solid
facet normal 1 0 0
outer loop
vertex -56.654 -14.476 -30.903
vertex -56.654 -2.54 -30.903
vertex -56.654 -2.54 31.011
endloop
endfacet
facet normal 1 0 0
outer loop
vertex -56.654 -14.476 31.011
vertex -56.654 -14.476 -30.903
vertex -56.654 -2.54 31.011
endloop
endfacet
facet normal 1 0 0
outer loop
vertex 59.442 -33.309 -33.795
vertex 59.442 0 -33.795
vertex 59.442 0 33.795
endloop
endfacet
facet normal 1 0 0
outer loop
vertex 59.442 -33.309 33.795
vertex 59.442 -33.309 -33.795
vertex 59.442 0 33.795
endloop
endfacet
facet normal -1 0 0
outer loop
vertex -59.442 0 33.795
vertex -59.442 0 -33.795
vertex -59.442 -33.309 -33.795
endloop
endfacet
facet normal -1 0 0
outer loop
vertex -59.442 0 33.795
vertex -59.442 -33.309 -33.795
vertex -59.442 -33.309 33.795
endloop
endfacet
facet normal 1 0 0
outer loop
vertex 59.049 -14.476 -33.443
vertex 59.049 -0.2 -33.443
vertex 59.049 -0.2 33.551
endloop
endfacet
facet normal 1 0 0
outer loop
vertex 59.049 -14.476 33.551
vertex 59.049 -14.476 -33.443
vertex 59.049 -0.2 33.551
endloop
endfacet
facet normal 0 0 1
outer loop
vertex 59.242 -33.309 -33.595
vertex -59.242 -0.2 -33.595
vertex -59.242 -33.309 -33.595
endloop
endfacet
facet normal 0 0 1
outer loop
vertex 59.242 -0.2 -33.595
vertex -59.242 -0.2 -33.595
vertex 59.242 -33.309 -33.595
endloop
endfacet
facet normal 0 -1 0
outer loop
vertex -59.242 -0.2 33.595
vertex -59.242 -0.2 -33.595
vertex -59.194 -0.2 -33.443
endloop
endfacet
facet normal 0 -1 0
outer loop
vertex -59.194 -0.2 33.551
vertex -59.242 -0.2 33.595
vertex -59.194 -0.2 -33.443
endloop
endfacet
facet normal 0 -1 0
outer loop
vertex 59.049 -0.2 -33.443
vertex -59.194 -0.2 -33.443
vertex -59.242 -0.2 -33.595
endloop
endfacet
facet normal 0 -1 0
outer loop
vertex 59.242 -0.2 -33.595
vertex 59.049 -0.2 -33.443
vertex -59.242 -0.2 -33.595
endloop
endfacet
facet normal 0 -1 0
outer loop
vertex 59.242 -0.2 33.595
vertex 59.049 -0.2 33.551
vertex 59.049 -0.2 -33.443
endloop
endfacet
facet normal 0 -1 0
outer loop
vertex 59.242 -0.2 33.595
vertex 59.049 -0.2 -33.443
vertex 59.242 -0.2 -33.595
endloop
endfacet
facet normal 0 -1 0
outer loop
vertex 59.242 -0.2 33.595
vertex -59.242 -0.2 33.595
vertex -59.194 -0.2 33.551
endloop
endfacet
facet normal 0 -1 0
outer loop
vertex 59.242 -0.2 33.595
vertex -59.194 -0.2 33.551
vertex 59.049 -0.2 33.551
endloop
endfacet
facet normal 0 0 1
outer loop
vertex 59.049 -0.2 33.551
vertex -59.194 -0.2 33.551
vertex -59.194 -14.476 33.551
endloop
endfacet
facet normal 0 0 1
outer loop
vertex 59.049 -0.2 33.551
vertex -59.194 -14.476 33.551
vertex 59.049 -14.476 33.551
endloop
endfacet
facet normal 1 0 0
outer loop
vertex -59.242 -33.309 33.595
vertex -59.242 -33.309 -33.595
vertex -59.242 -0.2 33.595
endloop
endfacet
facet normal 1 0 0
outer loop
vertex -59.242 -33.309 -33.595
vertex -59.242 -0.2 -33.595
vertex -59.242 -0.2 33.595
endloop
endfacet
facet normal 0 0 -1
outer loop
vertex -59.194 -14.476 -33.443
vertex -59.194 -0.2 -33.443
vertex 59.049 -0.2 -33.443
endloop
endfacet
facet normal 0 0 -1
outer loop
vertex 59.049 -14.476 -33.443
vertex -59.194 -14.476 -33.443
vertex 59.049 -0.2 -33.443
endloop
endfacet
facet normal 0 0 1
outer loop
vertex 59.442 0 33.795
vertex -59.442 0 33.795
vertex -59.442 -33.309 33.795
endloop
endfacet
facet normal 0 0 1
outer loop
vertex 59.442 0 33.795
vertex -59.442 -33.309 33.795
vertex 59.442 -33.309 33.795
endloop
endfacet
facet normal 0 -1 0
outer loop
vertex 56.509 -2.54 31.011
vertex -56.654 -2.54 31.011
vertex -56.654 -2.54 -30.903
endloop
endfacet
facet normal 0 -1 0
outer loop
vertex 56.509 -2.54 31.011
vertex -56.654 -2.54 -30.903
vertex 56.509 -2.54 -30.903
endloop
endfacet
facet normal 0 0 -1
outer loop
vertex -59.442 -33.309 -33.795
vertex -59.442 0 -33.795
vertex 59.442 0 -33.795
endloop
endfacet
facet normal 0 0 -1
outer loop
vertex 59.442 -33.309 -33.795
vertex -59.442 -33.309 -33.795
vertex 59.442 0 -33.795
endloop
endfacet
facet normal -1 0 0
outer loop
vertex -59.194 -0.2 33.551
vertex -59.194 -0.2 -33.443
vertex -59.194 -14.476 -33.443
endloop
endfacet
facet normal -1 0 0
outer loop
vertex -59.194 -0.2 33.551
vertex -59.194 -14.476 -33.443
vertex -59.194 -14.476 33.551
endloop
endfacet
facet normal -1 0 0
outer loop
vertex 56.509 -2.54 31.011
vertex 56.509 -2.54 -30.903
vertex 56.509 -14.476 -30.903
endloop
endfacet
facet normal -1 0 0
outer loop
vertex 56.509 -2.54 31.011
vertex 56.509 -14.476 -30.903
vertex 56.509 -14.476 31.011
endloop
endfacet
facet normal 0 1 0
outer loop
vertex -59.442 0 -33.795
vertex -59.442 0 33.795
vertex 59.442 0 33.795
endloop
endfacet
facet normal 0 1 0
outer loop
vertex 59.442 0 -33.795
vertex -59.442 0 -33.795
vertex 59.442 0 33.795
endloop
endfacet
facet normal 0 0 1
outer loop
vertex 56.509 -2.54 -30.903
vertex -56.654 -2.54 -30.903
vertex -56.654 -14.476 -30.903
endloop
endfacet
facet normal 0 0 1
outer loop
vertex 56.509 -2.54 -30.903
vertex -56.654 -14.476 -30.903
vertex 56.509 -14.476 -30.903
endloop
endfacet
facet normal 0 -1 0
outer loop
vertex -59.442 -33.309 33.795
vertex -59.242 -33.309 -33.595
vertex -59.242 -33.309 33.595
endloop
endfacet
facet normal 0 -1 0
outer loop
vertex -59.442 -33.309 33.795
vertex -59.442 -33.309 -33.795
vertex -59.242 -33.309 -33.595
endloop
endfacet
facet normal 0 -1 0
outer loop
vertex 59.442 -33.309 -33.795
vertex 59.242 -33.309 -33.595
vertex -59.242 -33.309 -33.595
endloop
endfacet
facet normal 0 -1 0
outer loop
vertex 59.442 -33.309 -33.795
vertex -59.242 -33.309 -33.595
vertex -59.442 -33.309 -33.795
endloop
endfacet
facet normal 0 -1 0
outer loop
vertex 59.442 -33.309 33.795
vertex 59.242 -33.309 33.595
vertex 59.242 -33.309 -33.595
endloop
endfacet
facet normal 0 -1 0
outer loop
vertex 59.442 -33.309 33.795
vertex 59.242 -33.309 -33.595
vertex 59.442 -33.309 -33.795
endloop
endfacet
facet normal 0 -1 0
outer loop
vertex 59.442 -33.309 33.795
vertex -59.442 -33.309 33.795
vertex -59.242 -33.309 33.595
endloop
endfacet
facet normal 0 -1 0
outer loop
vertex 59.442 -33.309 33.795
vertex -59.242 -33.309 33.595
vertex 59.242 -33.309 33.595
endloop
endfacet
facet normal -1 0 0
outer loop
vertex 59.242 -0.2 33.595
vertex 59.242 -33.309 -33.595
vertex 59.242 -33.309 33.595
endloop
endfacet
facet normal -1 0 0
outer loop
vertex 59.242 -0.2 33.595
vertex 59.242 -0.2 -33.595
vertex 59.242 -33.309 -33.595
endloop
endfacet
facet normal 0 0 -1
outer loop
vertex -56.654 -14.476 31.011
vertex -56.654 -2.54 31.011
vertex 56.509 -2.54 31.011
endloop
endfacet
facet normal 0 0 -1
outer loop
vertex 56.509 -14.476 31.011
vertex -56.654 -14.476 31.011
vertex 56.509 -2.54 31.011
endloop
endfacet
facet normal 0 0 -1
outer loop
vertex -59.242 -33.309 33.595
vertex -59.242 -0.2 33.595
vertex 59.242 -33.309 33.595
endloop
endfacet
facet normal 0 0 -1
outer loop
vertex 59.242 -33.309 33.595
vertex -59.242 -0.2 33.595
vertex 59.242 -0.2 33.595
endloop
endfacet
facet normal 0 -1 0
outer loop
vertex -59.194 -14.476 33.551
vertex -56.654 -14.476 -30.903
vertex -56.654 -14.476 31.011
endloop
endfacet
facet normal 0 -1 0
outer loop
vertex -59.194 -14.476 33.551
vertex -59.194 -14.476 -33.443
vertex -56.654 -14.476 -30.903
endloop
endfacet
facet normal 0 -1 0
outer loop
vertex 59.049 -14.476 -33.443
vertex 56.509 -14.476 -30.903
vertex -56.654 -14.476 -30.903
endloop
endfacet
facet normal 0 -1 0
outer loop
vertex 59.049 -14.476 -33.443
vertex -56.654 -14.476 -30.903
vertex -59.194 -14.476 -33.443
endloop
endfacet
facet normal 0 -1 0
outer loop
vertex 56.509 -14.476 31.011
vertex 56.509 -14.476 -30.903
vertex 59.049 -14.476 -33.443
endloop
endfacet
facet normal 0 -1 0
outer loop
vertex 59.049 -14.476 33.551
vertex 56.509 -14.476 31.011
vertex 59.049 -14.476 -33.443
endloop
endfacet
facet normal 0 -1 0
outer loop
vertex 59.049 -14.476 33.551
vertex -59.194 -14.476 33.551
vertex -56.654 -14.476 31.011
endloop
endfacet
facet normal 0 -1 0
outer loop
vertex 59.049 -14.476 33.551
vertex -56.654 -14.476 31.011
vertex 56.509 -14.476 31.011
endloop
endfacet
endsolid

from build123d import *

# Parameters (mm, degrees)
F0_W     = 118.8842207193
F0_H     = 67.5890743732
F1_DEPTH = 33.3094447851
F2_T     = -0.2
F3_W     = 118.2425096631
F3_H     = 66.9943261892
F4_DEPTH = 14.4755076617
F5_T     = -2.54


with BuildPart() as f1:
    # F0 (on Front) → F1 (new body)
    with BuildSketch(Plane.XZ):
        Rectangle(F0_W, F0_H)
    extrude(amount=F1_DEPTH)

    # F2
    f2_openings = [f1.faces().sort_by_distance(p)[0] for p in [
        (0, -33.309445, 0),
    ]]
    offset(amount=F2_T, openings=f2_openings)

    # F3 (on Front) → F4 (join)
    with BuildSketch(Plane.XZ):
        with Locations((-0.072285533, 0.0539822504)):
            Rectangle(F3_W, F3_H)
    extrude(amount=F4_DEPTH)

    # F5
    f5_openings = [f1.faces().sort_by_distance(p)[0] for p in [
        (0, -16.754722, 33.594537),
        (-0.072286, -14.475508, 0.053982),
    ]]
    offset(amount=F5_T, openings=f5_openings)


solid = f1.part
